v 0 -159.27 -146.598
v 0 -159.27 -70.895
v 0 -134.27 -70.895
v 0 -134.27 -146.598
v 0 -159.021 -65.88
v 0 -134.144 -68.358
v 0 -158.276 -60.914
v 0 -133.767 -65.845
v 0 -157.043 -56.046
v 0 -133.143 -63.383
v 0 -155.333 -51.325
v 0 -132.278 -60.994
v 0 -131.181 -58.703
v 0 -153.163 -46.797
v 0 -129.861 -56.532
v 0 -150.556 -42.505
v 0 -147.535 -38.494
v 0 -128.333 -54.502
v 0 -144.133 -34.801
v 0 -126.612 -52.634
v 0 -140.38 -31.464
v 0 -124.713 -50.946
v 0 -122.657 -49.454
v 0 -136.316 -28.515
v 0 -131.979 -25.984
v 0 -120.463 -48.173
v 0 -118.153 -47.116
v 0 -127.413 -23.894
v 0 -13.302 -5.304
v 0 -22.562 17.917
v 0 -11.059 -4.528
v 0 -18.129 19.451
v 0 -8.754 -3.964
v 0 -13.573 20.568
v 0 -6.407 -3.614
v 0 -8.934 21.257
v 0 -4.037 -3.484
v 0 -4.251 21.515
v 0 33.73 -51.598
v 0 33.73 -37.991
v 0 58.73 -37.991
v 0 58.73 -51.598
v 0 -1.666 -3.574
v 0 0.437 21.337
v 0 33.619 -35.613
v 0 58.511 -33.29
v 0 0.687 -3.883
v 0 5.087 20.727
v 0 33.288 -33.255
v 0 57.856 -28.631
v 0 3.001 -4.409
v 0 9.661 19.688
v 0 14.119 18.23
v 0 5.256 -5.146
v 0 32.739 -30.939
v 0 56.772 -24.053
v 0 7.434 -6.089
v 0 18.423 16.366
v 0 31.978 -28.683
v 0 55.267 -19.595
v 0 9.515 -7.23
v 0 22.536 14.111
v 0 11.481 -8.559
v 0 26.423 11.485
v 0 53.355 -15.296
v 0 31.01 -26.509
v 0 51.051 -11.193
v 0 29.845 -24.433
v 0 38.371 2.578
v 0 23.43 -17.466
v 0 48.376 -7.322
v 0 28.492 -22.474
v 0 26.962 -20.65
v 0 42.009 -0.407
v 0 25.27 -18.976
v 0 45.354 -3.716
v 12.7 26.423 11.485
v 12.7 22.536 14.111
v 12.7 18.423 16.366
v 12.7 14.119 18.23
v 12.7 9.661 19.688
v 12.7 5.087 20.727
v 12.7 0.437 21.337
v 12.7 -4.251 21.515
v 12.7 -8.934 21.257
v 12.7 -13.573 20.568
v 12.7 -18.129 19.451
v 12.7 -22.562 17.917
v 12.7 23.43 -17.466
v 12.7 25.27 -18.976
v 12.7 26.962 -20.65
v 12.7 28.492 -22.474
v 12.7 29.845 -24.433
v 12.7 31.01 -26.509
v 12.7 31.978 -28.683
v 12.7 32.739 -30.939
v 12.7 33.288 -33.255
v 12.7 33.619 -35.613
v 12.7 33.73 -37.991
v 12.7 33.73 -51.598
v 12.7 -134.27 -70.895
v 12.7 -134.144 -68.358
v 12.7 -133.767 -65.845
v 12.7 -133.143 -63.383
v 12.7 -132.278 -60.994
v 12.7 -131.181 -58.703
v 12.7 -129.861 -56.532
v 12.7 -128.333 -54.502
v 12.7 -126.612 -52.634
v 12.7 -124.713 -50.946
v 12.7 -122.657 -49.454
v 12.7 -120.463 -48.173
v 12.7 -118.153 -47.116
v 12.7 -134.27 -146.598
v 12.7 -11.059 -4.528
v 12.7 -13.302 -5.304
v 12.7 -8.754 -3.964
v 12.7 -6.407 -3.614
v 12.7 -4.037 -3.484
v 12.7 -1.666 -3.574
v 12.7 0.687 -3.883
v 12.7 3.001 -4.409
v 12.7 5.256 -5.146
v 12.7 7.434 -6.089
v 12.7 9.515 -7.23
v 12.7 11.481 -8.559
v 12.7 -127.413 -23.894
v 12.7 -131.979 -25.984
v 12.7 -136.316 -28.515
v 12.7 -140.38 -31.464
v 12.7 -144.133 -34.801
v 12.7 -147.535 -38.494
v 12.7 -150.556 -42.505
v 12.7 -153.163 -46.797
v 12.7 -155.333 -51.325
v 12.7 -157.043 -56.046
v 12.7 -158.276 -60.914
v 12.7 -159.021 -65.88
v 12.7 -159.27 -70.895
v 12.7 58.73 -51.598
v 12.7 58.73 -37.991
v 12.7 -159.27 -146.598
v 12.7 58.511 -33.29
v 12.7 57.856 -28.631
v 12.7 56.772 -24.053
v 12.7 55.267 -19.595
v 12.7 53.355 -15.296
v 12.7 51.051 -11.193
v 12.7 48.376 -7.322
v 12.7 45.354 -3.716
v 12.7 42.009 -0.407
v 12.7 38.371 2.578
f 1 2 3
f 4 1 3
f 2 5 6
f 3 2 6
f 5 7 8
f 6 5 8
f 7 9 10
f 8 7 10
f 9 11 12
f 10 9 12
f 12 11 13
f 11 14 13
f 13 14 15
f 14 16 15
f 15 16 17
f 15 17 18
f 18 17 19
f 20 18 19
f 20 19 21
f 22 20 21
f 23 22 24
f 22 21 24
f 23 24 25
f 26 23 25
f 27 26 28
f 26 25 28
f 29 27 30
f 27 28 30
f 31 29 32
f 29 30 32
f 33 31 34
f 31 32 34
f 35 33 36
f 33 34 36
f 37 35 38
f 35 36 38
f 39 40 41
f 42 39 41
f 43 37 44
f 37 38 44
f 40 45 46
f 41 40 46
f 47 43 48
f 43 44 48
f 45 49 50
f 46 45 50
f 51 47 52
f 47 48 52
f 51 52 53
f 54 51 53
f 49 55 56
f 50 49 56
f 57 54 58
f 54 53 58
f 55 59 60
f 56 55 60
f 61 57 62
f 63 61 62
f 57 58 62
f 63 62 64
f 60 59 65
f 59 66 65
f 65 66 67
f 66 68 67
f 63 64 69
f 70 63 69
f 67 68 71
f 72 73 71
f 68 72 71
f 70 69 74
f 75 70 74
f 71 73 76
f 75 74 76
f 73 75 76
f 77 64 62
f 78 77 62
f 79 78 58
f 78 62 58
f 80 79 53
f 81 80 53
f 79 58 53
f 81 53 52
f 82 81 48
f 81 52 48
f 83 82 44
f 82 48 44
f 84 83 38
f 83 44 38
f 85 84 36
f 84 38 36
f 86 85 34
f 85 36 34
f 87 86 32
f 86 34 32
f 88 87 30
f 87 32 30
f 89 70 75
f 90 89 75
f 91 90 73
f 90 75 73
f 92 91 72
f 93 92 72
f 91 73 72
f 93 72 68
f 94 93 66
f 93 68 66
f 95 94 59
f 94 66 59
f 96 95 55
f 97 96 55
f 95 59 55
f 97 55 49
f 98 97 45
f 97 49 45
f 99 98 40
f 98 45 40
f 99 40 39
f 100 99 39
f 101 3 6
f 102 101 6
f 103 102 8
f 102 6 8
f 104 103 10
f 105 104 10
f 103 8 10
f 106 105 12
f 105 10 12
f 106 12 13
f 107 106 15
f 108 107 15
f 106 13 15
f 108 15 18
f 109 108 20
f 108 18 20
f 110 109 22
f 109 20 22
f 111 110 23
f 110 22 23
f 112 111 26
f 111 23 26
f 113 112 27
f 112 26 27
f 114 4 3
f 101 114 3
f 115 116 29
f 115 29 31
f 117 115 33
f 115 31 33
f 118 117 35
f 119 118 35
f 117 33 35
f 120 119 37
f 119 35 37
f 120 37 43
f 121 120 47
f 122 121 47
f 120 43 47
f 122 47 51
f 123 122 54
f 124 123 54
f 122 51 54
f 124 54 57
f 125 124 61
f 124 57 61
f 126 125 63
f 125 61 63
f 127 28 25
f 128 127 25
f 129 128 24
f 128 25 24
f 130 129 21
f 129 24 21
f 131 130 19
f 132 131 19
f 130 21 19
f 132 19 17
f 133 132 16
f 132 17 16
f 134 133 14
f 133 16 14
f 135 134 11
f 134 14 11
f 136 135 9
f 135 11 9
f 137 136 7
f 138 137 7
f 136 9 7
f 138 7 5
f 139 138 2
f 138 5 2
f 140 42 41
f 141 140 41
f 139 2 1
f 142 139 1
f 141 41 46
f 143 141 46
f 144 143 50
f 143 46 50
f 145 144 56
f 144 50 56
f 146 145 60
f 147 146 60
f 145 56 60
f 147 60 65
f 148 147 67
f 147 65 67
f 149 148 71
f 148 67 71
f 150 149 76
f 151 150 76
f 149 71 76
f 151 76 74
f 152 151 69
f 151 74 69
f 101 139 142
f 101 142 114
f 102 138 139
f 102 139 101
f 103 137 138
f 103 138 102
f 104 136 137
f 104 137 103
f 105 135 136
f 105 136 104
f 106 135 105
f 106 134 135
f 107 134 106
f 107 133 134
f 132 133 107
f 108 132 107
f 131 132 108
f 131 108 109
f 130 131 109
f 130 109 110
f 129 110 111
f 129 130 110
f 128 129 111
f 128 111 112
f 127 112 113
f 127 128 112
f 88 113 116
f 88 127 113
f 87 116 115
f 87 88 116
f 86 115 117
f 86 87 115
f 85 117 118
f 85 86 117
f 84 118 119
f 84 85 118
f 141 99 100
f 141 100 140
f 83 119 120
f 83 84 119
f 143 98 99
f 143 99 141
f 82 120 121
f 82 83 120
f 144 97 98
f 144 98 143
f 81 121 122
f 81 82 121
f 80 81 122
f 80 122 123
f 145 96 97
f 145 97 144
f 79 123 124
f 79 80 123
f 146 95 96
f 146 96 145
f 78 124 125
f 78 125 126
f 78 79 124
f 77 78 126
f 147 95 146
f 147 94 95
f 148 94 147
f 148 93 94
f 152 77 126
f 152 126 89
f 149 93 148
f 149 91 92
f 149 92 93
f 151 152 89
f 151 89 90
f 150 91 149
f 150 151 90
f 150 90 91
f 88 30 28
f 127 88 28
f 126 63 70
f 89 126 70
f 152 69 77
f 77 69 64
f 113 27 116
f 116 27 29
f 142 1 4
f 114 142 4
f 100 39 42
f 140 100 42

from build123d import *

# Parameters (mm, degrees)
F1_DEPTH = 12.7


with BuildPart() as f1:
    # F0 (on Right) → F1 (new body)
    with BuildSketch(Plane.YZ):
        with BuildLine():
            ThreePointArc((-127.4130486986, -23.8944376975), (-150.5555928046, -42.505234855), (-159.2704062288, -70.8952180447))
            Line((-159.2704062288, -70.8952180447), (-159.2704062288, -146.5982919273))
            Line((-159.2704062288, -146.5982919273), (-134.2704062288, -146.5982919273))
            Line((-134.2704062288, -146.5982919273), (-134.2704062288, -70.8952180447))
            Line((-134.2704062288, -70.8952180447), (-134.2704062288, -53.5434135268))
            Line((-134.2704062288, -53.5434135268), (-118.1528498499, -47.1161671181))
            Line((-118.1528498499, -47.1161671181), (-13.3015476427, -5.3042981397))
            Line((-13.3015476427, -5.3042981397), (0, 0))
            Line((0, 0), (11.4811224988, -8.5586549536))
            Line((11.4811224988, -8.5586549536), (23.4298202916, -17.4658660356))
            Line((23.4298202916, -17.4658660356), (33.7295937712, -25.143878993))
            Line((33.7295937712, -25.143878993), (33.7295937712, -37.9905601483))
            Line((33.7295937712, -37.9905601483), (33.7295937712, -51.5982919273))
            Line((33.7295937712, -51.5982919273), (58.7295937712, -51.5982919273))
            Line((58.7295937712, -51.5982919273), (58.7295937712, -37.9905601483))
            ThreePointArc((58.7295937712, -37.9905601483), (53.3545747633, -15.295602685), (38.371447753, 2.577780559))
            Line((38.371447753, 2.577780559), (26.4227499601, 11.4849916409))
            ThreePointArc((26.4227499601, 11.4849916409), (2.7689181611, 21.0859439695), (-22.5617464914, 17.9174312808))
            Line((-22.5617464914, 17.9174312808), (-127.4130486986, -23.8944376975))
        make_face()
        with BuildLine():
            Line((-134.2704062288, -53.5434135268), (-134.2704062288, -70.8952180447))
            ThreePointArc((-134.2704062288, -70.8952180447), (-129.8613306624, -56.5319063914), (-118.1528498499, -47.1161671181))
            Line((-118.1528498499, -47.1161671181), (-134.2704062288, -53.5434135268))
        make_face()
        with BuildLine():
            Line((0, 0), (-13.3015476427, -5.3042981397))
            ThreePointArc((-13.3015476427, -5.3042981397), (-0.4860335102, -3.7012561471), (11.4811224988, -8.5586549536))
            Line((11.4811224988, -8.5586549536), (0, 0))
        make_face()
        with BuildLine():
            Line((33.7295937712, -25.143878993), (23.4298202916, -17.4658660356))
            ThreePointArc((23.4298202916, -17.4658660356), (31.0102165656, -26.5085263329), (33.7295937712, -37.9905601483))
            Line((33.7295937712, -37.9905601483), (33.7295937712, -25.143878993))
        make_face()
    extrude(amount=F1_DEPTH)


solid = f1.part
